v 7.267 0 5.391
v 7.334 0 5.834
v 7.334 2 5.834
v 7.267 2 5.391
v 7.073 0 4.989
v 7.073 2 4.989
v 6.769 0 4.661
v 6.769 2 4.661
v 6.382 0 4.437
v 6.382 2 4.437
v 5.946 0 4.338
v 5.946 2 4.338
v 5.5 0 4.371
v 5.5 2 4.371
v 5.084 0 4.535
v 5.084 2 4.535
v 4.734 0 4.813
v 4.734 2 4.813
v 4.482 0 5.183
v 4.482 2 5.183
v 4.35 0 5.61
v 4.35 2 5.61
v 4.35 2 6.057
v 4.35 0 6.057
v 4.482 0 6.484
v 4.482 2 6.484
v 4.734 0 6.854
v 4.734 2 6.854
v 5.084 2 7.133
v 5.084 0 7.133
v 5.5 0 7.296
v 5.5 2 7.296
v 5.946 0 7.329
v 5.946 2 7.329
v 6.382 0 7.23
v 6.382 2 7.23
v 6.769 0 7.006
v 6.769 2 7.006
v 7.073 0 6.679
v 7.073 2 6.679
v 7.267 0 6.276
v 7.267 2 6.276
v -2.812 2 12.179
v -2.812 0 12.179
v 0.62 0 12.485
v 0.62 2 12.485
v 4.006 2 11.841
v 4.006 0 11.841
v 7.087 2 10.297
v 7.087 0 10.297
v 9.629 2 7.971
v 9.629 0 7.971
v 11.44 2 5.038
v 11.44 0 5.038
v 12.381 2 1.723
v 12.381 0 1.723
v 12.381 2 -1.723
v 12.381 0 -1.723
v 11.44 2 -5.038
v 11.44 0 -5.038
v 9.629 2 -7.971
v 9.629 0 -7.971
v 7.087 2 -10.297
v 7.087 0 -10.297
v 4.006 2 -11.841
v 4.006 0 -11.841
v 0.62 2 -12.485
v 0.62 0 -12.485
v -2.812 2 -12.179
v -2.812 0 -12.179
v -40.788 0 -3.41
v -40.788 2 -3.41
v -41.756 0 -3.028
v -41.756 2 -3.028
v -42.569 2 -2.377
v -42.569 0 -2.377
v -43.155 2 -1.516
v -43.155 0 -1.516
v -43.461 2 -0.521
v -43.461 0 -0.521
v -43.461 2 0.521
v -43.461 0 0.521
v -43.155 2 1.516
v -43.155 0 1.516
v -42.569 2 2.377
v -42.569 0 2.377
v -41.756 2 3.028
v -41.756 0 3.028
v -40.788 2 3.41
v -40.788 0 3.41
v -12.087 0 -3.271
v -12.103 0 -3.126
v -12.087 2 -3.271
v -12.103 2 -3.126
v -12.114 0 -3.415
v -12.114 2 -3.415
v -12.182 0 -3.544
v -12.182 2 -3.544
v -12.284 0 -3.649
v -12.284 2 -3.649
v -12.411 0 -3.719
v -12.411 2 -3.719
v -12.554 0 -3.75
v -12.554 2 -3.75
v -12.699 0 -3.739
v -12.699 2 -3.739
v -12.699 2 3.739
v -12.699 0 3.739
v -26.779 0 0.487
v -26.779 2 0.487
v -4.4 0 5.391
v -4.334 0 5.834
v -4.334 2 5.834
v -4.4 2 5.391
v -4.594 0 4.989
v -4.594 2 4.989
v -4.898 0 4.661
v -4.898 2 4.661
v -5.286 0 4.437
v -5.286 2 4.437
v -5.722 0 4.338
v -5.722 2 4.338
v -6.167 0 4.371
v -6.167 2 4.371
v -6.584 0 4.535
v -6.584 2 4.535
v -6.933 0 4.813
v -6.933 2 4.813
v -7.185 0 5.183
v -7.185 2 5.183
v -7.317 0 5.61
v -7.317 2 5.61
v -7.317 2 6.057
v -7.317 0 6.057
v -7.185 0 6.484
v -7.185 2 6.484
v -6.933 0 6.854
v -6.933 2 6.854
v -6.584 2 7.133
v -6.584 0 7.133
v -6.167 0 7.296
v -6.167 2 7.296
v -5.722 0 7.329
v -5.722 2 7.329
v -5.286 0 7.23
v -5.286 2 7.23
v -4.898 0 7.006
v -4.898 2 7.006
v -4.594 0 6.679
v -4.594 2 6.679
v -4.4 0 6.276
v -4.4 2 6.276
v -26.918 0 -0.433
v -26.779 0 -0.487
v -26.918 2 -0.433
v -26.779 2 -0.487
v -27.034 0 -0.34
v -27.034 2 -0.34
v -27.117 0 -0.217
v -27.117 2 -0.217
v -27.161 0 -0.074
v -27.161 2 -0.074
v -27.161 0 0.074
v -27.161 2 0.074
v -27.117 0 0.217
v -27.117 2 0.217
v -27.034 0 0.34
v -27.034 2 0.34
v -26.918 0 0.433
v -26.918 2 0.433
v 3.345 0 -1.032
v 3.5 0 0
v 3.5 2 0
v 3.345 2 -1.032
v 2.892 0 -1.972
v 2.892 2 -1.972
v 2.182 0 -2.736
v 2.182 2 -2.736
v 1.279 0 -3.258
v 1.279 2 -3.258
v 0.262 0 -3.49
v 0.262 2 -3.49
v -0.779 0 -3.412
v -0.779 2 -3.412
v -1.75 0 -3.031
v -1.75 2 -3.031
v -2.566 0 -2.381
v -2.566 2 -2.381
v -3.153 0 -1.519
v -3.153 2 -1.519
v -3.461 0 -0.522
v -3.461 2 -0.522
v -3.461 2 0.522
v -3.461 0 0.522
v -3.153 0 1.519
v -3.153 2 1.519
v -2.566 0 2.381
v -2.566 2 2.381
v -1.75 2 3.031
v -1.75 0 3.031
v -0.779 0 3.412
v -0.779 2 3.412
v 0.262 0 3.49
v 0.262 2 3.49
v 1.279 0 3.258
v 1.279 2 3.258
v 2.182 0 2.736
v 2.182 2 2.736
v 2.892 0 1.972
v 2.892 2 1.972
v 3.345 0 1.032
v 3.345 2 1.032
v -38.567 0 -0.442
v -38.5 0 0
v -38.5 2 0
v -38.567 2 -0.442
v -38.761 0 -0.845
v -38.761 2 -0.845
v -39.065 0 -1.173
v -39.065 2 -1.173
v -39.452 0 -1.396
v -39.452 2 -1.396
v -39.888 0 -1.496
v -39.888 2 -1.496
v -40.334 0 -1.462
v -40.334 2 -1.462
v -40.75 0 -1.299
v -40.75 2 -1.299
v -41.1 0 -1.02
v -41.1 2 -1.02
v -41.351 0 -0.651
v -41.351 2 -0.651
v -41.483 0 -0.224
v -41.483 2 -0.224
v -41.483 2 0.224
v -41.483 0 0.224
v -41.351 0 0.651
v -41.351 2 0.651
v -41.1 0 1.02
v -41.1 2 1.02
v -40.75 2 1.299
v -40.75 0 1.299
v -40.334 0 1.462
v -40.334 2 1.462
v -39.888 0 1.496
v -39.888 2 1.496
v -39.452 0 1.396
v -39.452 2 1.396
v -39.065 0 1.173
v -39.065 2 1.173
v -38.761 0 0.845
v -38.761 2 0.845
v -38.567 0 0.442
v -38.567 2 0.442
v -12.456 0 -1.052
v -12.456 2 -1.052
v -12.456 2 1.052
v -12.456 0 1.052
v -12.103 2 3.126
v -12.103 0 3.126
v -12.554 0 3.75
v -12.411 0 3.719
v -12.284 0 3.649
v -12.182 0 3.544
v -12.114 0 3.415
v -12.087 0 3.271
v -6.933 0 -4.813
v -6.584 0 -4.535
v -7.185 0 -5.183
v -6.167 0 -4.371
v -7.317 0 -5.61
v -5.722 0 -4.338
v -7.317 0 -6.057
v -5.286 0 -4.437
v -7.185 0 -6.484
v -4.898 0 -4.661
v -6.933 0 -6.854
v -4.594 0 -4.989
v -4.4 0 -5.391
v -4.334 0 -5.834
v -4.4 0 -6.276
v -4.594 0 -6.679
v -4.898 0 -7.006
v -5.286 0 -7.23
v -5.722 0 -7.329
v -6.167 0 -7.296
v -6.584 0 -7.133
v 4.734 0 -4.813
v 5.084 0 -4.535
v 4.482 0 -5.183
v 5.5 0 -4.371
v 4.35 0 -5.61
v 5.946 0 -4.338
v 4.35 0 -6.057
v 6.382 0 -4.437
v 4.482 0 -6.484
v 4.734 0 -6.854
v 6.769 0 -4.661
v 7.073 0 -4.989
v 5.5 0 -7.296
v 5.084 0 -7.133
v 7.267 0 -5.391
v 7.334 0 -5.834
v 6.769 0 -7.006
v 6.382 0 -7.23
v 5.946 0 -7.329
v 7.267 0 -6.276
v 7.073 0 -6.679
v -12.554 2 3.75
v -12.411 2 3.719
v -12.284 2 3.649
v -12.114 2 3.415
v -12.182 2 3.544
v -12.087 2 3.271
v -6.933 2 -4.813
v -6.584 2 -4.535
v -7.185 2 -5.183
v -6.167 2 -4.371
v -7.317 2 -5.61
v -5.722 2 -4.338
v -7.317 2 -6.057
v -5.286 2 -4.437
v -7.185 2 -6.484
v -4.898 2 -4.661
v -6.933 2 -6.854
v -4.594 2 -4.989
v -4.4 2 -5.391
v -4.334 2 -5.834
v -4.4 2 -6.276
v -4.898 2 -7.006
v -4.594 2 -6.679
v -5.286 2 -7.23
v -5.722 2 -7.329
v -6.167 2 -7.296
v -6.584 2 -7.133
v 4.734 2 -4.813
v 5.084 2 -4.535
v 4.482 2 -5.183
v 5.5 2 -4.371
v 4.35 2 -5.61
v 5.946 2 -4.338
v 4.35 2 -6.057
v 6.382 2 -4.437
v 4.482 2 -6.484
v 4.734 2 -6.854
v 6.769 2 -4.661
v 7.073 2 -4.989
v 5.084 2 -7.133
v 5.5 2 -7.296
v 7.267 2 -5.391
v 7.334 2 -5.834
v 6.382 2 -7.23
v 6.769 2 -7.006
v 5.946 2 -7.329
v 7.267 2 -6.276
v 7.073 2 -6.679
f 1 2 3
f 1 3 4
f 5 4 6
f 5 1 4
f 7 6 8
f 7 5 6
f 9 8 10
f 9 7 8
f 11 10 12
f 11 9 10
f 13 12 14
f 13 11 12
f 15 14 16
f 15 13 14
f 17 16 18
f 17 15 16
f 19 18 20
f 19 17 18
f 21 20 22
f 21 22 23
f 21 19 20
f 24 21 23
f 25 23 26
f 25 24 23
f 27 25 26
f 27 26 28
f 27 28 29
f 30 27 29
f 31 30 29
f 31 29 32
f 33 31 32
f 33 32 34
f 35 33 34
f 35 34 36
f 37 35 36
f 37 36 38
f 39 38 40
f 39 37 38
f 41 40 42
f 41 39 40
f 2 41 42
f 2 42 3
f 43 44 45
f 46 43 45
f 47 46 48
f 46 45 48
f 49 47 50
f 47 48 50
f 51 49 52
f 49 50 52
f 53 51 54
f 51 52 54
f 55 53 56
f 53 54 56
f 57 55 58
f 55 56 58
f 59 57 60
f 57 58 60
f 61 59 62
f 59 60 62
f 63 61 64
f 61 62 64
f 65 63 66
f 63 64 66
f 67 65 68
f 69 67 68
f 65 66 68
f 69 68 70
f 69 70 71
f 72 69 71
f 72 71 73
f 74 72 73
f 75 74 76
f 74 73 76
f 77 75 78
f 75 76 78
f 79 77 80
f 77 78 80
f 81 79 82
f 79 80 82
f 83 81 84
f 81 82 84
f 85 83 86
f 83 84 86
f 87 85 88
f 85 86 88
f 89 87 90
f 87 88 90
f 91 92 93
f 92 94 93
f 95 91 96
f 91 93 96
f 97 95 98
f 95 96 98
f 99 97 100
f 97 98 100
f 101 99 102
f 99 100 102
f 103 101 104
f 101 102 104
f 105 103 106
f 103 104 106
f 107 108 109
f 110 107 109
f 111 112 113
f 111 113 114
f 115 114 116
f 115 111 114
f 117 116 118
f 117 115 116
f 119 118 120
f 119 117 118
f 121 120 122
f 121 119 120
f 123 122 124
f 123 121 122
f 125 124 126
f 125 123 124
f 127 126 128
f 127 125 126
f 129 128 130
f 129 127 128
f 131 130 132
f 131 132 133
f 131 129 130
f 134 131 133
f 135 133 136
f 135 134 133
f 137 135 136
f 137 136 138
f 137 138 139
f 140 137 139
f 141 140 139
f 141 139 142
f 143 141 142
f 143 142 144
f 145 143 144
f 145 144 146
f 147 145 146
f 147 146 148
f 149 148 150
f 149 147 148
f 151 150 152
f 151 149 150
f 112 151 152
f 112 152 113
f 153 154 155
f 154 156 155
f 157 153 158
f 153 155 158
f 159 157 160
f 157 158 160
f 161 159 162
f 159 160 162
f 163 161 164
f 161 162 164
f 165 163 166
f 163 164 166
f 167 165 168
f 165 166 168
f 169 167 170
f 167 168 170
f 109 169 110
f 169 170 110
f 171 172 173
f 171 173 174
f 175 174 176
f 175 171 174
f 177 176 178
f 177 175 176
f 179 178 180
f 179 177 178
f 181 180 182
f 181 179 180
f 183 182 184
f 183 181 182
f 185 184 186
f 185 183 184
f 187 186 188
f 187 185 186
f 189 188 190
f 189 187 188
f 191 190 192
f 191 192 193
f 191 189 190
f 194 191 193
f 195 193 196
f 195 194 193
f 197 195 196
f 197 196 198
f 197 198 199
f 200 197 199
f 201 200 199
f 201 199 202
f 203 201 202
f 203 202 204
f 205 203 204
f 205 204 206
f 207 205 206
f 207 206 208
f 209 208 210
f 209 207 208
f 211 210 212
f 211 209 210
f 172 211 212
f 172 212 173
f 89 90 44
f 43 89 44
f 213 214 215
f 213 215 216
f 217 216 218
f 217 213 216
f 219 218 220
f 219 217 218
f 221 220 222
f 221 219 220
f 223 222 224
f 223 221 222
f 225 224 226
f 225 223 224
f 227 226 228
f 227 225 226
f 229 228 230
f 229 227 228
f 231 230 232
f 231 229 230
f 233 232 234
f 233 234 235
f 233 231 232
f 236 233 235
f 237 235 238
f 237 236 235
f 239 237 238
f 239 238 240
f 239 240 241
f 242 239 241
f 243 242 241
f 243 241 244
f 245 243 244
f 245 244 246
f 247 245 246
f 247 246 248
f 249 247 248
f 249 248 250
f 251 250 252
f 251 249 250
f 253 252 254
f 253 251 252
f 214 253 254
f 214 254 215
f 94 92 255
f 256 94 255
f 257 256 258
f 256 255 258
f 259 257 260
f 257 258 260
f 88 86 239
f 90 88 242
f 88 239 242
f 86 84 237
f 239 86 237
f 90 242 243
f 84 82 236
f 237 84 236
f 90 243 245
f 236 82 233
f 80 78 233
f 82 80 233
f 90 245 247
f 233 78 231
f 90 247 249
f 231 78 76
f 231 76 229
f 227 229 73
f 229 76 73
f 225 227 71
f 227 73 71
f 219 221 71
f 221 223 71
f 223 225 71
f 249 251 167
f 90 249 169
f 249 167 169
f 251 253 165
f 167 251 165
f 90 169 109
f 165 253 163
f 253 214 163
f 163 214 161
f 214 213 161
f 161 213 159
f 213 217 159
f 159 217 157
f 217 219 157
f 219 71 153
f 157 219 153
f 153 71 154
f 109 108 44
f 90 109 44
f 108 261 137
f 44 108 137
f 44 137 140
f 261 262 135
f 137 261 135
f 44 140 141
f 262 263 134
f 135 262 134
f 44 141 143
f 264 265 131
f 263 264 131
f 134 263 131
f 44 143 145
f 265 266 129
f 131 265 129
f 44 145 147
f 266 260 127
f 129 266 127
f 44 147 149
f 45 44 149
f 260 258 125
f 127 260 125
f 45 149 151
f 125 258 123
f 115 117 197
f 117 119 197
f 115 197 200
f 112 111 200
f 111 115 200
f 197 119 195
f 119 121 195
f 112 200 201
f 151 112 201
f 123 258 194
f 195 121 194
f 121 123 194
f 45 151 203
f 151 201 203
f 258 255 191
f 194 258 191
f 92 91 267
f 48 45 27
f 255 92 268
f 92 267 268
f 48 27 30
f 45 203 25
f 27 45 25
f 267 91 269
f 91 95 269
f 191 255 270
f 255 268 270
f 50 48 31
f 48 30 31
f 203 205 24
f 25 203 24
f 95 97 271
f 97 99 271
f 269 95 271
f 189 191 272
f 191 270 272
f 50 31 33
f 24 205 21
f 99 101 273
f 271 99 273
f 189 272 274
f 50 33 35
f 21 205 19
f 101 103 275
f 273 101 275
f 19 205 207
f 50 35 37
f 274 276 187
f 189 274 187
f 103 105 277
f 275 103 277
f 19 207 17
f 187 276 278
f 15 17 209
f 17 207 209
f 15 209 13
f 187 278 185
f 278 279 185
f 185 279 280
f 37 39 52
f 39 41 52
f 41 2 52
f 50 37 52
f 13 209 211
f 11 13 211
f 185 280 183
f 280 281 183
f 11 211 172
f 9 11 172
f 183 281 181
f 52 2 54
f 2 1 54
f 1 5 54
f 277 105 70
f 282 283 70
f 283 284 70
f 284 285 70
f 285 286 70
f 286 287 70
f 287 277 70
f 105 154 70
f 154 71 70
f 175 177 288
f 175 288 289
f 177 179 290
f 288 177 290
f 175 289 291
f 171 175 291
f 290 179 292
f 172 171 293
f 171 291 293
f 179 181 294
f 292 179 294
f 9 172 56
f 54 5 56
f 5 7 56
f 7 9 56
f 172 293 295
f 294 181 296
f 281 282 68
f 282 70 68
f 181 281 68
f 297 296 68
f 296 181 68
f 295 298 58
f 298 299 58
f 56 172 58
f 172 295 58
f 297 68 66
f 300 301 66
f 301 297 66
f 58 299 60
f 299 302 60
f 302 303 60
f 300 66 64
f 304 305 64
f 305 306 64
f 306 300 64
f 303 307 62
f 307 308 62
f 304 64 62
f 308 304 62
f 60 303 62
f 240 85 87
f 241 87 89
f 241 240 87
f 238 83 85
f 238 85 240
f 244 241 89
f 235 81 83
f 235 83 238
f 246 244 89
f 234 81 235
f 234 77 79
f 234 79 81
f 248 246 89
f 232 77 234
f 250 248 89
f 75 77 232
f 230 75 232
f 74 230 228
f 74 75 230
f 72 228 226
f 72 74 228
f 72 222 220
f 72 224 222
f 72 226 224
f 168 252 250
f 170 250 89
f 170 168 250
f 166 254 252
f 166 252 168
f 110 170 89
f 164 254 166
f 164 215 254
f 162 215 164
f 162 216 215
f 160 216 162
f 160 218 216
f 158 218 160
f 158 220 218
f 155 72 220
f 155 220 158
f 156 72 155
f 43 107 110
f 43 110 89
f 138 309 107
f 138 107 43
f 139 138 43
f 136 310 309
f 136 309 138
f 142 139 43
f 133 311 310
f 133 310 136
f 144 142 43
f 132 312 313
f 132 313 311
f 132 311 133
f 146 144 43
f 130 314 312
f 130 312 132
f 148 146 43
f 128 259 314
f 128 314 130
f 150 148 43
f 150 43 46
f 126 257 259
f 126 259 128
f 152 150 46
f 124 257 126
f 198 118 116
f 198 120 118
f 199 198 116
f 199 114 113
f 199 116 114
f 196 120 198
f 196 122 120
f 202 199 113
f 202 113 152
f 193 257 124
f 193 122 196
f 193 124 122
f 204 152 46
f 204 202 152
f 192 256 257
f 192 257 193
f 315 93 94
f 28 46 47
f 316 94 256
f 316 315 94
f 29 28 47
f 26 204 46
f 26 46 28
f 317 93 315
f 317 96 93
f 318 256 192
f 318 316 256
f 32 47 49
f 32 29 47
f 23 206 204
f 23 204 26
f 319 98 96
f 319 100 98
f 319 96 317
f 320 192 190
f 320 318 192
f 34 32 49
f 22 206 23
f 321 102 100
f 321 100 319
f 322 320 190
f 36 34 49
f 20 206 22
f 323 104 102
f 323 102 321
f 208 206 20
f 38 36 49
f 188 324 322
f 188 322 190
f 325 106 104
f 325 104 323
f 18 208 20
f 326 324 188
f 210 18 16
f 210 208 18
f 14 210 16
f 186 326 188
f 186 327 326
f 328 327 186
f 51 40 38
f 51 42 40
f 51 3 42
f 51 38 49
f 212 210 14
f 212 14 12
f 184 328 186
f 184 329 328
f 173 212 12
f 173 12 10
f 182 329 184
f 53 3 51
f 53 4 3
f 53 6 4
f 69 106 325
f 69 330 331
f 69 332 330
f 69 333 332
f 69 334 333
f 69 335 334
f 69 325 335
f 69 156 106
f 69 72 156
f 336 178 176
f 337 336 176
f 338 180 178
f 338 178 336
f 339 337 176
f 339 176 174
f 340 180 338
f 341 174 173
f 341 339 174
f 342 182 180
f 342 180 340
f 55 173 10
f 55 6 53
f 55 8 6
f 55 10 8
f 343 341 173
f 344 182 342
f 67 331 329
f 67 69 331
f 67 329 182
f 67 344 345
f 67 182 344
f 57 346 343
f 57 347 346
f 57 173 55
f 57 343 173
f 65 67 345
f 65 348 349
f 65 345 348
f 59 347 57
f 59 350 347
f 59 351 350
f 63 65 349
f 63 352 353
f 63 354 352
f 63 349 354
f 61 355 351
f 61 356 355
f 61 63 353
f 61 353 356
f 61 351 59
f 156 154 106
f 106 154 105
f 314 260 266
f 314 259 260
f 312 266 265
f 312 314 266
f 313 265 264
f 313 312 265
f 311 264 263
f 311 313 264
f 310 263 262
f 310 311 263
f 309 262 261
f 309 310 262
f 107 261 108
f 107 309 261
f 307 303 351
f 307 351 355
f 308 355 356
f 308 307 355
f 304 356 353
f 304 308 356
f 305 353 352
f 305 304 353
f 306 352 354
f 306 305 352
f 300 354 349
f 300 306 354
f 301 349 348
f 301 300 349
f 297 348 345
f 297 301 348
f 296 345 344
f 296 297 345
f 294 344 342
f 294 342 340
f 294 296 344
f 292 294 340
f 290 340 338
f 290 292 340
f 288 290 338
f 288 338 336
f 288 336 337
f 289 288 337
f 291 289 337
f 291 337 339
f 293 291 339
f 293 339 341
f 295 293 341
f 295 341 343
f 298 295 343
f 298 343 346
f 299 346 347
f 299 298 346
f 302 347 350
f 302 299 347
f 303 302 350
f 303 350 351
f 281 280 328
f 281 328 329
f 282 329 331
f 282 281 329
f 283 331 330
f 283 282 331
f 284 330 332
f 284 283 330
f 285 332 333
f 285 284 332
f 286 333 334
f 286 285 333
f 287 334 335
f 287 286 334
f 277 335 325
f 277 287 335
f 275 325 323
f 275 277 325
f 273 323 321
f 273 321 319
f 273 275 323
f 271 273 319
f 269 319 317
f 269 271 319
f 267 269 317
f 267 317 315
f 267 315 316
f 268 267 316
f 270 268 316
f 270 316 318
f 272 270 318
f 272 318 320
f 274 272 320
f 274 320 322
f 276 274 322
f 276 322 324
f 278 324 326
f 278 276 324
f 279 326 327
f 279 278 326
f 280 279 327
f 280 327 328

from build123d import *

# Parameters (mm, degrees)
SKETCH_1_R      = 1.5
SKETCH_1_R_2    = 3.5
EXTRUDE_1_DEPTH = 2
FILLET_1_R      = 0.5


with BuildPart() as part:
    # Эскиз1 → Бобышка-Вытянуть1 (new body)
    with BuildSketch(Plane(origin=(0, 0, 0), x_dir=(1, 0, 0), z_dir=(0, 1, 0))):
        with BuildLine():
            Line((-2.8125, 12.179484544), (-40.7875, 3.410255672))
            ThreePointArc((-40.7875, 3.410255672), (-43.5, 0), (-40.7875, -3.410255672))
            Line((-40.7875, -3.410255672), (-2.8125, -12.179484544))
            ThreePointArc((-2.8125, -12.179484544), (12.5, 0), (-2.8125, 12.179484544))
        make_face()
        with BuildLine():
            Line((-11.865804763, -3.930989356), (-28.888888889, 0))
            Line((-28.888888889, 0), (-11.865804763, 3.930989356))
            ThreePointArc((-11.865804763, 3.930989356), (-12.5, 0), (-11.865804763, -3.930989356))
        make_face(mode=Mode.SUBTRACT)
        with Locations((-40, 0)):
            Circle(SKETCH_1_R, mode=Mode.SUBTRACT)
        with Locations((5.833630945, 5.833630945)):
            Circle(SKETCH_1_R, mode=Mode.SUBTRACT)
        Circle(SKETCH_1_R_2, mode=Mode.SUBTRACT)
        with Locations((-5.833630945, -5.833630945)):
            Circle(SKETCH_1_R, mode=Mode.SUBTRACT)
        with Locations((5.833630945, -5.833630945)):
            Circle(SKETCH_1_R, mode=Mode.SUBTRACT)
        with Locations((-5.833630945, 5.833630945)):
            Circle(SKETCH_1_R, mode=Mode.SUBTRACT)
    extrude(amount=EXTRUDE_1_DEPTH)

    # Скругление1
    fillet_1_edges = [part.edges().sort_by_distance(p)[0] for p in [
        (-11.865804763, 1, -3.930989356),
        (-28.888888889, 1, 0),
        (-11.865804763, 1, 3.930989356),
    ]]
    fillet(fillet_1_edges, radius=FILLET_1_R)


solid = part.part
